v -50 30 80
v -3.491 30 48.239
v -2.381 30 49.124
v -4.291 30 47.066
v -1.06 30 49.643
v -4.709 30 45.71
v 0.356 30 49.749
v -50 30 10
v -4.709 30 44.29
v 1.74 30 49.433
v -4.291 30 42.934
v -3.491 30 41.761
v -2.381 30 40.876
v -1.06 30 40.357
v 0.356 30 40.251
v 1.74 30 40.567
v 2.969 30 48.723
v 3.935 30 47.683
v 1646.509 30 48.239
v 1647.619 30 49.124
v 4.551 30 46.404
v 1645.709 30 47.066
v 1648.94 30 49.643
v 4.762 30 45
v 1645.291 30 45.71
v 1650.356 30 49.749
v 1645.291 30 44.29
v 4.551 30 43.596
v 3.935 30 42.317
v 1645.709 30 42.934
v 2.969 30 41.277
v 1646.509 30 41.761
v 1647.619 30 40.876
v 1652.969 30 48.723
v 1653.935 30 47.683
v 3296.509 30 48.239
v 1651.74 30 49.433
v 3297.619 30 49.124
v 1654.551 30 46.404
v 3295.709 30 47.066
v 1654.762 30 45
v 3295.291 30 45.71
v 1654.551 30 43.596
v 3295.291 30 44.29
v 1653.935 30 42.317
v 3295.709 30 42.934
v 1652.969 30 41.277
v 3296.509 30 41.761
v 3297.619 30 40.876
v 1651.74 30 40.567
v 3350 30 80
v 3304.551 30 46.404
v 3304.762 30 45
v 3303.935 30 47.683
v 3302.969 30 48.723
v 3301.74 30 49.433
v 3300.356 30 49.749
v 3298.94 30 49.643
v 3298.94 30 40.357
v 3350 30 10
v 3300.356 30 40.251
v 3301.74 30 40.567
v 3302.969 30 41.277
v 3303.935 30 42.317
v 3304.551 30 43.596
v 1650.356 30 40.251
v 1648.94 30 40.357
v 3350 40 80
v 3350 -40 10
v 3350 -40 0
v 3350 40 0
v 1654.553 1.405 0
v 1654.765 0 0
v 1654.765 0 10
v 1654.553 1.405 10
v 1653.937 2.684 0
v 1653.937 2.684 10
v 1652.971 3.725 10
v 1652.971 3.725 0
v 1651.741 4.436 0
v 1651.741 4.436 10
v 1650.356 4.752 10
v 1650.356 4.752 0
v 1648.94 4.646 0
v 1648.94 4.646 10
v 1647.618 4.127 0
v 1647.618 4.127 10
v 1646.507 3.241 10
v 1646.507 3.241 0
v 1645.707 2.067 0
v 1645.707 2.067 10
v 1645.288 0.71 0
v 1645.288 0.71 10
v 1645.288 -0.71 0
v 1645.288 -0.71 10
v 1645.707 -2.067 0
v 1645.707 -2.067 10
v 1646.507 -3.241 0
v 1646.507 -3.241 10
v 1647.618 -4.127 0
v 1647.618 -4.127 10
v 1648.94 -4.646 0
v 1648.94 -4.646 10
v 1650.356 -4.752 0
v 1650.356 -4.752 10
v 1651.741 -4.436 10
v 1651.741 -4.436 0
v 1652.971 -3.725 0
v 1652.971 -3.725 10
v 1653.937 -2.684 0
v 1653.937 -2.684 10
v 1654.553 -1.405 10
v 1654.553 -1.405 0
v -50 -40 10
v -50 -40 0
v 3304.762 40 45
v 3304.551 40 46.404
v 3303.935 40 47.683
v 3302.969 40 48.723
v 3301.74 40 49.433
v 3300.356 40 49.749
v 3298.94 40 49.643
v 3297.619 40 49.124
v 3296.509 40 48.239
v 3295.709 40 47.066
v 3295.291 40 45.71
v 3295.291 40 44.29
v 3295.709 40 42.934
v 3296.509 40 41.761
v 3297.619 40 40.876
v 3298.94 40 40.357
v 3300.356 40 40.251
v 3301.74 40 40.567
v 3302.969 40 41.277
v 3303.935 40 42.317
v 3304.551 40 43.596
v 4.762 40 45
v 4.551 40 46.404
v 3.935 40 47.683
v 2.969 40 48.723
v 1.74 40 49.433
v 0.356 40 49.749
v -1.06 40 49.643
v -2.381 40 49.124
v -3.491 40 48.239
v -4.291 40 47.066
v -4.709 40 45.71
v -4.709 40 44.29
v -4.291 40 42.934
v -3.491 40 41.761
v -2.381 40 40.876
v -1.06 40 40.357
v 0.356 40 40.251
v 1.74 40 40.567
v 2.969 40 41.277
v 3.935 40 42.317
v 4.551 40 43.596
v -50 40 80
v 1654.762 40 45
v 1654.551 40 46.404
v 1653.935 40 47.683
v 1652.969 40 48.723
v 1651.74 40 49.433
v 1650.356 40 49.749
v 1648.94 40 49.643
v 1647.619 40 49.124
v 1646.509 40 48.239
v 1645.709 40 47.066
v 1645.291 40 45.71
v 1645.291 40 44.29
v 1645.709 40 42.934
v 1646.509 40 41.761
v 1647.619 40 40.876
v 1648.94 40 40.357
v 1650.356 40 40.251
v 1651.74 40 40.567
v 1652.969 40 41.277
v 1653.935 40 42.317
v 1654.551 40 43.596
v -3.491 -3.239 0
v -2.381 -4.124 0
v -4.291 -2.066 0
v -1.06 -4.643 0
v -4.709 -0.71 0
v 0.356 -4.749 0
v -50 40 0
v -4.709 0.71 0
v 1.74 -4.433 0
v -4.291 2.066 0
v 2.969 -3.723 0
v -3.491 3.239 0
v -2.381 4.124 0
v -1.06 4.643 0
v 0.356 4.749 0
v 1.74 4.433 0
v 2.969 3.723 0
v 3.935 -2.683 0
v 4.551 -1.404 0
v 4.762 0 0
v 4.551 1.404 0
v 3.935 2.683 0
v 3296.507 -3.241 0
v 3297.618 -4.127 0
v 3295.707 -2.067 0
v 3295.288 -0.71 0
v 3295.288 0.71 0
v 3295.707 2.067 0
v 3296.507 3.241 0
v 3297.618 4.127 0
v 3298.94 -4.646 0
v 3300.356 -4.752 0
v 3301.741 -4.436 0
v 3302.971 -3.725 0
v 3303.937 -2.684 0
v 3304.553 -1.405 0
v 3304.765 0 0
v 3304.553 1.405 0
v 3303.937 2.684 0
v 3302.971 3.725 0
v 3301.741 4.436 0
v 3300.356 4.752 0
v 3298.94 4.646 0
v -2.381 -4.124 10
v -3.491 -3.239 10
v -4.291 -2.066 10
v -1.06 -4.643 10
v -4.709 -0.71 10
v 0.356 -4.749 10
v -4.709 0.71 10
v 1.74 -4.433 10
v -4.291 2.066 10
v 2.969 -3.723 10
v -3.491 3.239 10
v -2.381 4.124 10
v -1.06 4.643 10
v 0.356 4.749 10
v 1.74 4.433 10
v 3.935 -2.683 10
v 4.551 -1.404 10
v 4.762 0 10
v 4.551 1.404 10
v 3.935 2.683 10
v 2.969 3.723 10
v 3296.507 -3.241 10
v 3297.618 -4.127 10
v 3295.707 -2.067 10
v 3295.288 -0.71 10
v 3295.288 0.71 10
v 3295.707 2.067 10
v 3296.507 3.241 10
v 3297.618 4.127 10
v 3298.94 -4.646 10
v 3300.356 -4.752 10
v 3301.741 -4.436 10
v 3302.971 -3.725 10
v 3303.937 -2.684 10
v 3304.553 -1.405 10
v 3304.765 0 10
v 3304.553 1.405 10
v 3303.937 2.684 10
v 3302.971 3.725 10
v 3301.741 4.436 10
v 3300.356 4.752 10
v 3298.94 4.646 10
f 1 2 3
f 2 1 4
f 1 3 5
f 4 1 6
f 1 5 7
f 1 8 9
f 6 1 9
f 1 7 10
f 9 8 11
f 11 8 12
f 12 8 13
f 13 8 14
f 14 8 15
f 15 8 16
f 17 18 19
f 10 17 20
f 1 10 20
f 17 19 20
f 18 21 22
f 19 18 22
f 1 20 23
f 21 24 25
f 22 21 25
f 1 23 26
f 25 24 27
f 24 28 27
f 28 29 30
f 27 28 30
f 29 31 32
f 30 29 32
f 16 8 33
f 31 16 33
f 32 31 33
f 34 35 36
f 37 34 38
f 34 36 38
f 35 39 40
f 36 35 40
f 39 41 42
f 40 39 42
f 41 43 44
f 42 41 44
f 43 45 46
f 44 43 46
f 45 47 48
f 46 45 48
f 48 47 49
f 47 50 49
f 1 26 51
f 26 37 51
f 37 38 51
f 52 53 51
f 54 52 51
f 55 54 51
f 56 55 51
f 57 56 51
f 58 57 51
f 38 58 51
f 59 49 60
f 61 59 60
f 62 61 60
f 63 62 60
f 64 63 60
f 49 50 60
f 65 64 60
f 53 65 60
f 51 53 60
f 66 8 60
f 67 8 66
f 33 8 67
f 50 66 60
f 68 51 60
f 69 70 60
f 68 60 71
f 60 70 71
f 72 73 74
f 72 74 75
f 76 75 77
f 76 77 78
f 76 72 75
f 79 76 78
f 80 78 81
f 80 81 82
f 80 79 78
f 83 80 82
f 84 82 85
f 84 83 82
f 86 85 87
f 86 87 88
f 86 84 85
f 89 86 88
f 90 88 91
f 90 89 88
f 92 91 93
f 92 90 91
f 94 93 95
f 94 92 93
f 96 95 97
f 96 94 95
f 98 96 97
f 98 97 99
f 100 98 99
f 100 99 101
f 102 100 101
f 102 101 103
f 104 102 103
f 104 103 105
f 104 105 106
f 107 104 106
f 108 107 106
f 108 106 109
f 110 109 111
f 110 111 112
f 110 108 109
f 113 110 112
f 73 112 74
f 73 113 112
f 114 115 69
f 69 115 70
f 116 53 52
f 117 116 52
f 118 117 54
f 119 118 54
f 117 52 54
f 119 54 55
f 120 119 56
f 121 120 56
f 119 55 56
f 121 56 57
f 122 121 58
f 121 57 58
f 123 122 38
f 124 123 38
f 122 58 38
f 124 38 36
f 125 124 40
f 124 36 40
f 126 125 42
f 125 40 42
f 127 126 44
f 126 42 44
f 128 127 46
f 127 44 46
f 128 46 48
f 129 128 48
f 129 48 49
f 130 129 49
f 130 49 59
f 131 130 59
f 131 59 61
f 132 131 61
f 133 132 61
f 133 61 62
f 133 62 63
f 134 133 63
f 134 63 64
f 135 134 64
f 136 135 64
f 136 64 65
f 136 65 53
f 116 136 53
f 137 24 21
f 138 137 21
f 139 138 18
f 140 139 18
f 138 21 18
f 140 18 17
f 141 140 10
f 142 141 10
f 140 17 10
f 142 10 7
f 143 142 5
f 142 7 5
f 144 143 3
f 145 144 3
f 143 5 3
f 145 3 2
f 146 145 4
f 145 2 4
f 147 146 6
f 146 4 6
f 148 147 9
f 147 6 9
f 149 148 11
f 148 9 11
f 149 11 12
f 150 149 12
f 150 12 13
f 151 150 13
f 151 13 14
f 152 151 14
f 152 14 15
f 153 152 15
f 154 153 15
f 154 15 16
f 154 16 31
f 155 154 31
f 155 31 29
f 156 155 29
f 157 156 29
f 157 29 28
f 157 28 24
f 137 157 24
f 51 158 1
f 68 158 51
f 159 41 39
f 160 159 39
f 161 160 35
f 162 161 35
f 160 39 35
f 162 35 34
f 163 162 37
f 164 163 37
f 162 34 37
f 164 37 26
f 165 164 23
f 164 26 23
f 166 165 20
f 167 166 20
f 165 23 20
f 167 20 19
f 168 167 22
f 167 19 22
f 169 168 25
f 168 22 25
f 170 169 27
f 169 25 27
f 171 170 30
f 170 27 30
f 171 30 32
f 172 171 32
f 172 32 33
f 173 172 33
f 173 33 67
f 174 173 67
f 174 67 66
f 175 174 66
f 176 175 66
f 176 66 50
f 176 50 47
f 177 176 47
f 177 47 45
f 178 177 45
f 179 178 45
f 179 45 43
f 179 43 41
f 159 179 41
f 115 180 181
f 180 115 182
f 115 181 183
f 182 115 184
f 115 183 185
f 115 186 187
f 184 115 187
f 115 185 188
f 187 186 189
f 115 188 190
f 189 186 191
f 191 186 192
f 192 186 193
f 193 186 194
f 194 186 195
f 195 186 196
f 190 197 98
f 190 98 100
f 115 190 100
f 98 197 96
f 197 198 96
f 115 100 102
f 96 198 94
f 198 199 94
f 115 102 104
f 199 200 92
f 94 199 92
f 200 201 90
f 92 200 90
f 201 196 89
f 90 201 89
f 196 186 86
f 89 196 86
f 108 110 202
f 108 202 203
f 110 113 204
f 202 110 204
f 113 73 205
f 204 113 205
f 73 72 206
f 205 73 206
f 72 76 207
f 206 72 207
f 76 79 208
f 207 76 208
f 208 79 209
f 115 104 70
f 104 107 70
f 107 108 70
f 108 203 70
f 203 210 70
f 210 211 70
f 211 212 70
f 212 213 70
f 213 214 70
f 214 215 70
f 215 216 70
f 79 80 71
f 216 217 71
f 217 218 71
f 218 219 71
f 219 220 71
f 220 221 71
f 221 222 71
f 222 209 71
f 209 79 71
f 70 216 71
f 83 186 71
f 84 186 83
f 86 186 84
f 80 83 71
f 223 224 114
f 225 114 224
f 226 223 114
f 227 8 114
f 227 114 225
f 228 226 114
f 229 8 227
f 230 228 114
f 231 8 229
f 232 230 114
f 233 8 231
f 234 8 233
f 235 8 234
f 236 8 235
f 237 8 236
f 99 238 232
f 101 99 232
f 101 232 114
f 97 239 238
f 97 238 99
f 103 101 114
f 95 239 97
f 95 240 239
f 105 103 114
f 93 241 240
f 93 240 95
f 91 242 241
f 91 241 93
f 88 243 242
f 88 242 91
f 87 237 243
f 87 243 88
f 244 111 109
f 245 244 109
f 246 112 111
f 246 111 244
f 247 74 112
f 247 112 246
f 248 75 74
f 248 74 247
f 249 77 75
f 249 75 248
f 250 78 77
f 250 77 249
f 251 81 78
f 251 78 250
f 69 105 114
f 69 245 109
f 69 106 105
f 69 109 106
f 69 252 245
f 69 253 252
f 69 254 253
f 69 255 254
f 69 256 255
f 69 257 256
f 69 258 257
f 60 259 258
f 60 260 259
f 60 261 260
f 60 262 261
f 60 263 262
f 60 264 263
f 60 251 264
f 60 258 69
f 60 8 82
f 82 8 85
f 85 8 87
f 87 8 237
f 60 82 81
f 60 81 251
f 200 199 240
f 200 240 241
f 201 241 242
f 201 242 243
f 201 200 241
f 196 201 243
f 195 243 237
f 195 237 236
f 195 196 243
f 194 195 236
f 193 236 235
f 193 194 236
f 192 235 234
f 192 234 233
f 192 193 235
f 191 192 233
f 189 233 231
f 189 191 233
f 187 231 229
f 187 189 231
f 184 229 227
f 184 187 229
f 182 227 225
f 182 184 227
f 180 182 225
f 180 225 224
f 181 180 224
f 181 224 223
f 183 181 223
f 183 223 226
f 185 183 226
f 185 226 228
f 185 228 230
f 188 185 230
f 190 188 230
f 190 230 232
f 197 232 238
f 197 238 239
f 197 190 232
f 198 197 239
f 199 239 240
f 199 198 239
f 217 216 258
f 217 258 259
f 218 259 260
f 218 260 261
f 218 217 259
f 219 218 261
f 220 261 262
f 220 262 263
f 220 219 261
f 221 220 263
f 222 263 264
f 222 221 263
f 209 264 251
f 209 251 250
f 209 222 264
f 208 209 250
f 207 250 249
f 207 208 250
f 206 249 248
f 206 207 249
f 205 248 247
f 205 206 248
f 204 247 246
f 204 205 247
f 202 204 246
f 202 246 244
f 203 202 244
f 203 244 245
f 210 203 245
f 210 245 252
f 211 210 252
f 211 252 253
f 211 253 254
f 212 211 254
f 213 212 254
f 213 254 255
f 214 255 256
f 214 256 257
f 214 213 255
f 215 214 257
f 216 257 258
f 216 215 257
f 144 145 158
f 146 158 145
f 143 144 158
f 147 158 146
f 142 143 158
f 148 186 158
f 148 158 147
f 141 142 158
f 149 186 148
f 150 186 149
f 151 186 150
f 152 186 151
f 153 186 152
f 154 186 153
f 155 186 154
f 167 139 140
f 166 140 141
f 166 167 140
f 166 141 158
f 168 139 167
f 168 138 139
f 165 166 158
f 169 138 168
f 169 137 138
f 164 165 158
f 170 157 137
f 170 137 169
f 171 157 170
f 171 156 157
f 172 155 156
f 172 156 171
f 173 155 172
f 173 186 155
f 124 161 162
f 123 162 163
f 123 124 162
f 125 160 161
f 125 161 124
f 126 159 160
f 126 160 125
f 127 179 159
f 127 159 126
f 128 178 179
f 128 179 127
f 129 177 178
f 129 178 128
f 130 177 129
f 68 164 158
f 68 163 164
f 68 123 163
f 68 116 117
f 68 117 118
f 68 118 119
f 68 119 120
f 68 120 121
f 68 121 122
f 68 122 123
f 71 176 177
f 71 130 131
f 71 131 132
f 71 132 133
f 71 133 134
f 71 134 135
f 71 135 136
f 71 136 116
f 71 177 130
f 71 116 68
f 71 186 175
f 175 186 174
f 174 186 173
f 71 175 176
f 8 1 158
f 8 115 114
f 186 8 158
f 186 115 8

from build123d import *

# Parameters (mm, degrees)
CROQUIS1_R              = 4.7625
CROQUIS1_R_2            = 4.765
SALIENTE_EXTRUIR1_DEPTH = 10
CROQUIS2_W              = 3400
CROQUIS2_H              = 10
SALIENTE_EXTRUIR2_DEPTH = 70
CROQUIS3_R              = 4.7625
CORTAR_EXTRUIR1_DEPTH   = 3352.686142824


with BuildPart() as part:
    # Croquis1 → Saliente-Extruir1 (new body)
    with BuildSketch(Plane.XY):
        Polygon((-50, 0), (-50, -40), (3350, -40), (3350, 40), (-50, 40), align=None)
        Circle(CROQUIS1_R, mode=Mode.SUBTRACT)
        with Locations((1650, 0)):
            Circle(CROQUIS1_R_2, mode=Mode.SUBTRACT)
        with Locations((3300, 0)):
            Circle(CROQUIS1_R_2, mode=Mode.SUBTRACT)
    extrude(amount=SALIENTE_EXTRUIR1_DEPTH)

    # Croquis2 → Saliente-Extruir2 (add)
    with BuildSketch(Plane.XY.offset(10)):
        with Locations((1650, 35)):
            Rectangle(CROQUIS2_W, CROQUIS2_H)
    extrude(amount=SALIENTE_EXTRUIR2_DEPTH)

    # Croquis3 → Cortar-Extruir1 (cut, through all)
    with BuildSketch(Plane.XZ.offset(-30)):
        with Locations((3300, 45)):
            Circle(CROQUIS3_R)
        with Locations((1650, 45)):
            Circle(CROQUIS3_R)
        with Locations((0, 45)):
            Circle(CROQUIS3_R)
    extrude(amount=-CORTAR_EXTRUIR1_DEPTH, mode=Mode.SUBTRACT)


solid = part.part
